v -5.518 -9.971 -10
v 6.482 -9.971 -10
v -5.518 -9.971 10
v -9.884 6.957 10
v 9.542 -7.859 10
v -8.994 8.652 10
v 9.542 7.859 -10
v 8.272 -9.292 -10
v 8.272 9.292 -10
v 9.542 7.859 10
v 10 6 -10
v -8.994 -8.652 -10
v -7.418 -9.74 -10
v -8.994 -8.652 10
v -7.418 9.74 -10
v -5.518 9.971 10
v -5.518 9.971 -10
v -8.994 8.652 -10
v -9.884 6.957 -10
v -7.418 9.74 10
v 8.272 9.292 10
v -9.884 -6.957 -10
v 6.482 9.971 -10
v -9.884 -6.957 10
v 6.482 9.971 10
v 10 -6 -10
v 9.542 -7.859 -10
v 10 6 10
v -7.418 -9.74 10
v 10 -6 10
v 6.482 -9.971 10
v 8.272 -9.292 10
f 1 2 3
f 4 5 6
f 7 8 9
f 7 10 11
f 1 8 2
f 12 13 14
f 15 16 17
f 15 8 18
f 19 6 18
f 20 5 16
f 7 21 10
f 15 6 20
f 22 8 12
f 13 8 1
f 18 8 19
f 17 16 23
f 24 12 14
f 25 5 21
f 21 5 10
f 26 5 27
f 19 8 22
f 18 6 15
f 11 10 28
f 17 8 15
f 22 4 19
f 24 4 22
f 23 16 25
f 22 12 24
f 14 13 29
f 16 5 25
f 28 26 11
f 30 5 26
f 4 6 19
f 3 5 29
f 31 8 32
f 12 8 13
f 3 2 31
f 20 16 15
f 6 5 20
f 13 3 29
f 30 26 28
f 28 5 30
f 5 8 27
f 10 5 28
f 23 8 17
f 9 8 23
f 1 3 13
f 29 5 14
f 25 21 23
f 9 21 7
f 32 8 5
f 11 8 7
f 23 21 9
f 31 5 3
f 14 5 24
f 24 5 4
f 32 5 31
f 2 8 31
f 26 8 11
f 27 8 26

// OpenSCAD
module rounded_cube(size = [1, 1, 1], center = false, r = 0.5) {
	// if single value, convert to [x, y, z] vector
	size = (size[0] == undef) ? [size, size, size] : size;

	translate = (center == false) ?
		[ r, r, r ] :
		[
			r - (size[0] / 2),
			r - (size[1] / 2),
			r - (size[2] / 2)
        ];

	translate(v = translate)
	minkowski() {
		cube(size = [
			size[0] - (r * 2),
			size[1] - (r * 2),
			size[2] - (r * 2)
		]);
		sphere(r);
	}
}


module rounded_column(size = [1, 1, 1], center = false, r = 0.5) {
	// if single value, convert to [x, y, z] vector
	size = (size[0] == undef) ? [size, size, size] : size;

    x = size[0] - 2*r;
    y = size[1] - 2*r;
    h = size[2];
    
	translate = (center == false) ?
		[ r, r, 0 ] :
		[
			r - (size[0] / 2),
			r - (size[1] / 2),
			  - h / 2
        ];

	translate(v = translate)
    hull() {
		translate([ 0, 0, 0 ]) cylinder(r=r, h);
		translate([ x, 0, 0 ]) cylinder(r=r, h);
		translate([ 0, y, 0 ]) cylinder(r=r, h);
		translate([ x, y, 0 ]) cylinder(r=r, h);
	}
}

rounded_column(20, r=4, center=true);
